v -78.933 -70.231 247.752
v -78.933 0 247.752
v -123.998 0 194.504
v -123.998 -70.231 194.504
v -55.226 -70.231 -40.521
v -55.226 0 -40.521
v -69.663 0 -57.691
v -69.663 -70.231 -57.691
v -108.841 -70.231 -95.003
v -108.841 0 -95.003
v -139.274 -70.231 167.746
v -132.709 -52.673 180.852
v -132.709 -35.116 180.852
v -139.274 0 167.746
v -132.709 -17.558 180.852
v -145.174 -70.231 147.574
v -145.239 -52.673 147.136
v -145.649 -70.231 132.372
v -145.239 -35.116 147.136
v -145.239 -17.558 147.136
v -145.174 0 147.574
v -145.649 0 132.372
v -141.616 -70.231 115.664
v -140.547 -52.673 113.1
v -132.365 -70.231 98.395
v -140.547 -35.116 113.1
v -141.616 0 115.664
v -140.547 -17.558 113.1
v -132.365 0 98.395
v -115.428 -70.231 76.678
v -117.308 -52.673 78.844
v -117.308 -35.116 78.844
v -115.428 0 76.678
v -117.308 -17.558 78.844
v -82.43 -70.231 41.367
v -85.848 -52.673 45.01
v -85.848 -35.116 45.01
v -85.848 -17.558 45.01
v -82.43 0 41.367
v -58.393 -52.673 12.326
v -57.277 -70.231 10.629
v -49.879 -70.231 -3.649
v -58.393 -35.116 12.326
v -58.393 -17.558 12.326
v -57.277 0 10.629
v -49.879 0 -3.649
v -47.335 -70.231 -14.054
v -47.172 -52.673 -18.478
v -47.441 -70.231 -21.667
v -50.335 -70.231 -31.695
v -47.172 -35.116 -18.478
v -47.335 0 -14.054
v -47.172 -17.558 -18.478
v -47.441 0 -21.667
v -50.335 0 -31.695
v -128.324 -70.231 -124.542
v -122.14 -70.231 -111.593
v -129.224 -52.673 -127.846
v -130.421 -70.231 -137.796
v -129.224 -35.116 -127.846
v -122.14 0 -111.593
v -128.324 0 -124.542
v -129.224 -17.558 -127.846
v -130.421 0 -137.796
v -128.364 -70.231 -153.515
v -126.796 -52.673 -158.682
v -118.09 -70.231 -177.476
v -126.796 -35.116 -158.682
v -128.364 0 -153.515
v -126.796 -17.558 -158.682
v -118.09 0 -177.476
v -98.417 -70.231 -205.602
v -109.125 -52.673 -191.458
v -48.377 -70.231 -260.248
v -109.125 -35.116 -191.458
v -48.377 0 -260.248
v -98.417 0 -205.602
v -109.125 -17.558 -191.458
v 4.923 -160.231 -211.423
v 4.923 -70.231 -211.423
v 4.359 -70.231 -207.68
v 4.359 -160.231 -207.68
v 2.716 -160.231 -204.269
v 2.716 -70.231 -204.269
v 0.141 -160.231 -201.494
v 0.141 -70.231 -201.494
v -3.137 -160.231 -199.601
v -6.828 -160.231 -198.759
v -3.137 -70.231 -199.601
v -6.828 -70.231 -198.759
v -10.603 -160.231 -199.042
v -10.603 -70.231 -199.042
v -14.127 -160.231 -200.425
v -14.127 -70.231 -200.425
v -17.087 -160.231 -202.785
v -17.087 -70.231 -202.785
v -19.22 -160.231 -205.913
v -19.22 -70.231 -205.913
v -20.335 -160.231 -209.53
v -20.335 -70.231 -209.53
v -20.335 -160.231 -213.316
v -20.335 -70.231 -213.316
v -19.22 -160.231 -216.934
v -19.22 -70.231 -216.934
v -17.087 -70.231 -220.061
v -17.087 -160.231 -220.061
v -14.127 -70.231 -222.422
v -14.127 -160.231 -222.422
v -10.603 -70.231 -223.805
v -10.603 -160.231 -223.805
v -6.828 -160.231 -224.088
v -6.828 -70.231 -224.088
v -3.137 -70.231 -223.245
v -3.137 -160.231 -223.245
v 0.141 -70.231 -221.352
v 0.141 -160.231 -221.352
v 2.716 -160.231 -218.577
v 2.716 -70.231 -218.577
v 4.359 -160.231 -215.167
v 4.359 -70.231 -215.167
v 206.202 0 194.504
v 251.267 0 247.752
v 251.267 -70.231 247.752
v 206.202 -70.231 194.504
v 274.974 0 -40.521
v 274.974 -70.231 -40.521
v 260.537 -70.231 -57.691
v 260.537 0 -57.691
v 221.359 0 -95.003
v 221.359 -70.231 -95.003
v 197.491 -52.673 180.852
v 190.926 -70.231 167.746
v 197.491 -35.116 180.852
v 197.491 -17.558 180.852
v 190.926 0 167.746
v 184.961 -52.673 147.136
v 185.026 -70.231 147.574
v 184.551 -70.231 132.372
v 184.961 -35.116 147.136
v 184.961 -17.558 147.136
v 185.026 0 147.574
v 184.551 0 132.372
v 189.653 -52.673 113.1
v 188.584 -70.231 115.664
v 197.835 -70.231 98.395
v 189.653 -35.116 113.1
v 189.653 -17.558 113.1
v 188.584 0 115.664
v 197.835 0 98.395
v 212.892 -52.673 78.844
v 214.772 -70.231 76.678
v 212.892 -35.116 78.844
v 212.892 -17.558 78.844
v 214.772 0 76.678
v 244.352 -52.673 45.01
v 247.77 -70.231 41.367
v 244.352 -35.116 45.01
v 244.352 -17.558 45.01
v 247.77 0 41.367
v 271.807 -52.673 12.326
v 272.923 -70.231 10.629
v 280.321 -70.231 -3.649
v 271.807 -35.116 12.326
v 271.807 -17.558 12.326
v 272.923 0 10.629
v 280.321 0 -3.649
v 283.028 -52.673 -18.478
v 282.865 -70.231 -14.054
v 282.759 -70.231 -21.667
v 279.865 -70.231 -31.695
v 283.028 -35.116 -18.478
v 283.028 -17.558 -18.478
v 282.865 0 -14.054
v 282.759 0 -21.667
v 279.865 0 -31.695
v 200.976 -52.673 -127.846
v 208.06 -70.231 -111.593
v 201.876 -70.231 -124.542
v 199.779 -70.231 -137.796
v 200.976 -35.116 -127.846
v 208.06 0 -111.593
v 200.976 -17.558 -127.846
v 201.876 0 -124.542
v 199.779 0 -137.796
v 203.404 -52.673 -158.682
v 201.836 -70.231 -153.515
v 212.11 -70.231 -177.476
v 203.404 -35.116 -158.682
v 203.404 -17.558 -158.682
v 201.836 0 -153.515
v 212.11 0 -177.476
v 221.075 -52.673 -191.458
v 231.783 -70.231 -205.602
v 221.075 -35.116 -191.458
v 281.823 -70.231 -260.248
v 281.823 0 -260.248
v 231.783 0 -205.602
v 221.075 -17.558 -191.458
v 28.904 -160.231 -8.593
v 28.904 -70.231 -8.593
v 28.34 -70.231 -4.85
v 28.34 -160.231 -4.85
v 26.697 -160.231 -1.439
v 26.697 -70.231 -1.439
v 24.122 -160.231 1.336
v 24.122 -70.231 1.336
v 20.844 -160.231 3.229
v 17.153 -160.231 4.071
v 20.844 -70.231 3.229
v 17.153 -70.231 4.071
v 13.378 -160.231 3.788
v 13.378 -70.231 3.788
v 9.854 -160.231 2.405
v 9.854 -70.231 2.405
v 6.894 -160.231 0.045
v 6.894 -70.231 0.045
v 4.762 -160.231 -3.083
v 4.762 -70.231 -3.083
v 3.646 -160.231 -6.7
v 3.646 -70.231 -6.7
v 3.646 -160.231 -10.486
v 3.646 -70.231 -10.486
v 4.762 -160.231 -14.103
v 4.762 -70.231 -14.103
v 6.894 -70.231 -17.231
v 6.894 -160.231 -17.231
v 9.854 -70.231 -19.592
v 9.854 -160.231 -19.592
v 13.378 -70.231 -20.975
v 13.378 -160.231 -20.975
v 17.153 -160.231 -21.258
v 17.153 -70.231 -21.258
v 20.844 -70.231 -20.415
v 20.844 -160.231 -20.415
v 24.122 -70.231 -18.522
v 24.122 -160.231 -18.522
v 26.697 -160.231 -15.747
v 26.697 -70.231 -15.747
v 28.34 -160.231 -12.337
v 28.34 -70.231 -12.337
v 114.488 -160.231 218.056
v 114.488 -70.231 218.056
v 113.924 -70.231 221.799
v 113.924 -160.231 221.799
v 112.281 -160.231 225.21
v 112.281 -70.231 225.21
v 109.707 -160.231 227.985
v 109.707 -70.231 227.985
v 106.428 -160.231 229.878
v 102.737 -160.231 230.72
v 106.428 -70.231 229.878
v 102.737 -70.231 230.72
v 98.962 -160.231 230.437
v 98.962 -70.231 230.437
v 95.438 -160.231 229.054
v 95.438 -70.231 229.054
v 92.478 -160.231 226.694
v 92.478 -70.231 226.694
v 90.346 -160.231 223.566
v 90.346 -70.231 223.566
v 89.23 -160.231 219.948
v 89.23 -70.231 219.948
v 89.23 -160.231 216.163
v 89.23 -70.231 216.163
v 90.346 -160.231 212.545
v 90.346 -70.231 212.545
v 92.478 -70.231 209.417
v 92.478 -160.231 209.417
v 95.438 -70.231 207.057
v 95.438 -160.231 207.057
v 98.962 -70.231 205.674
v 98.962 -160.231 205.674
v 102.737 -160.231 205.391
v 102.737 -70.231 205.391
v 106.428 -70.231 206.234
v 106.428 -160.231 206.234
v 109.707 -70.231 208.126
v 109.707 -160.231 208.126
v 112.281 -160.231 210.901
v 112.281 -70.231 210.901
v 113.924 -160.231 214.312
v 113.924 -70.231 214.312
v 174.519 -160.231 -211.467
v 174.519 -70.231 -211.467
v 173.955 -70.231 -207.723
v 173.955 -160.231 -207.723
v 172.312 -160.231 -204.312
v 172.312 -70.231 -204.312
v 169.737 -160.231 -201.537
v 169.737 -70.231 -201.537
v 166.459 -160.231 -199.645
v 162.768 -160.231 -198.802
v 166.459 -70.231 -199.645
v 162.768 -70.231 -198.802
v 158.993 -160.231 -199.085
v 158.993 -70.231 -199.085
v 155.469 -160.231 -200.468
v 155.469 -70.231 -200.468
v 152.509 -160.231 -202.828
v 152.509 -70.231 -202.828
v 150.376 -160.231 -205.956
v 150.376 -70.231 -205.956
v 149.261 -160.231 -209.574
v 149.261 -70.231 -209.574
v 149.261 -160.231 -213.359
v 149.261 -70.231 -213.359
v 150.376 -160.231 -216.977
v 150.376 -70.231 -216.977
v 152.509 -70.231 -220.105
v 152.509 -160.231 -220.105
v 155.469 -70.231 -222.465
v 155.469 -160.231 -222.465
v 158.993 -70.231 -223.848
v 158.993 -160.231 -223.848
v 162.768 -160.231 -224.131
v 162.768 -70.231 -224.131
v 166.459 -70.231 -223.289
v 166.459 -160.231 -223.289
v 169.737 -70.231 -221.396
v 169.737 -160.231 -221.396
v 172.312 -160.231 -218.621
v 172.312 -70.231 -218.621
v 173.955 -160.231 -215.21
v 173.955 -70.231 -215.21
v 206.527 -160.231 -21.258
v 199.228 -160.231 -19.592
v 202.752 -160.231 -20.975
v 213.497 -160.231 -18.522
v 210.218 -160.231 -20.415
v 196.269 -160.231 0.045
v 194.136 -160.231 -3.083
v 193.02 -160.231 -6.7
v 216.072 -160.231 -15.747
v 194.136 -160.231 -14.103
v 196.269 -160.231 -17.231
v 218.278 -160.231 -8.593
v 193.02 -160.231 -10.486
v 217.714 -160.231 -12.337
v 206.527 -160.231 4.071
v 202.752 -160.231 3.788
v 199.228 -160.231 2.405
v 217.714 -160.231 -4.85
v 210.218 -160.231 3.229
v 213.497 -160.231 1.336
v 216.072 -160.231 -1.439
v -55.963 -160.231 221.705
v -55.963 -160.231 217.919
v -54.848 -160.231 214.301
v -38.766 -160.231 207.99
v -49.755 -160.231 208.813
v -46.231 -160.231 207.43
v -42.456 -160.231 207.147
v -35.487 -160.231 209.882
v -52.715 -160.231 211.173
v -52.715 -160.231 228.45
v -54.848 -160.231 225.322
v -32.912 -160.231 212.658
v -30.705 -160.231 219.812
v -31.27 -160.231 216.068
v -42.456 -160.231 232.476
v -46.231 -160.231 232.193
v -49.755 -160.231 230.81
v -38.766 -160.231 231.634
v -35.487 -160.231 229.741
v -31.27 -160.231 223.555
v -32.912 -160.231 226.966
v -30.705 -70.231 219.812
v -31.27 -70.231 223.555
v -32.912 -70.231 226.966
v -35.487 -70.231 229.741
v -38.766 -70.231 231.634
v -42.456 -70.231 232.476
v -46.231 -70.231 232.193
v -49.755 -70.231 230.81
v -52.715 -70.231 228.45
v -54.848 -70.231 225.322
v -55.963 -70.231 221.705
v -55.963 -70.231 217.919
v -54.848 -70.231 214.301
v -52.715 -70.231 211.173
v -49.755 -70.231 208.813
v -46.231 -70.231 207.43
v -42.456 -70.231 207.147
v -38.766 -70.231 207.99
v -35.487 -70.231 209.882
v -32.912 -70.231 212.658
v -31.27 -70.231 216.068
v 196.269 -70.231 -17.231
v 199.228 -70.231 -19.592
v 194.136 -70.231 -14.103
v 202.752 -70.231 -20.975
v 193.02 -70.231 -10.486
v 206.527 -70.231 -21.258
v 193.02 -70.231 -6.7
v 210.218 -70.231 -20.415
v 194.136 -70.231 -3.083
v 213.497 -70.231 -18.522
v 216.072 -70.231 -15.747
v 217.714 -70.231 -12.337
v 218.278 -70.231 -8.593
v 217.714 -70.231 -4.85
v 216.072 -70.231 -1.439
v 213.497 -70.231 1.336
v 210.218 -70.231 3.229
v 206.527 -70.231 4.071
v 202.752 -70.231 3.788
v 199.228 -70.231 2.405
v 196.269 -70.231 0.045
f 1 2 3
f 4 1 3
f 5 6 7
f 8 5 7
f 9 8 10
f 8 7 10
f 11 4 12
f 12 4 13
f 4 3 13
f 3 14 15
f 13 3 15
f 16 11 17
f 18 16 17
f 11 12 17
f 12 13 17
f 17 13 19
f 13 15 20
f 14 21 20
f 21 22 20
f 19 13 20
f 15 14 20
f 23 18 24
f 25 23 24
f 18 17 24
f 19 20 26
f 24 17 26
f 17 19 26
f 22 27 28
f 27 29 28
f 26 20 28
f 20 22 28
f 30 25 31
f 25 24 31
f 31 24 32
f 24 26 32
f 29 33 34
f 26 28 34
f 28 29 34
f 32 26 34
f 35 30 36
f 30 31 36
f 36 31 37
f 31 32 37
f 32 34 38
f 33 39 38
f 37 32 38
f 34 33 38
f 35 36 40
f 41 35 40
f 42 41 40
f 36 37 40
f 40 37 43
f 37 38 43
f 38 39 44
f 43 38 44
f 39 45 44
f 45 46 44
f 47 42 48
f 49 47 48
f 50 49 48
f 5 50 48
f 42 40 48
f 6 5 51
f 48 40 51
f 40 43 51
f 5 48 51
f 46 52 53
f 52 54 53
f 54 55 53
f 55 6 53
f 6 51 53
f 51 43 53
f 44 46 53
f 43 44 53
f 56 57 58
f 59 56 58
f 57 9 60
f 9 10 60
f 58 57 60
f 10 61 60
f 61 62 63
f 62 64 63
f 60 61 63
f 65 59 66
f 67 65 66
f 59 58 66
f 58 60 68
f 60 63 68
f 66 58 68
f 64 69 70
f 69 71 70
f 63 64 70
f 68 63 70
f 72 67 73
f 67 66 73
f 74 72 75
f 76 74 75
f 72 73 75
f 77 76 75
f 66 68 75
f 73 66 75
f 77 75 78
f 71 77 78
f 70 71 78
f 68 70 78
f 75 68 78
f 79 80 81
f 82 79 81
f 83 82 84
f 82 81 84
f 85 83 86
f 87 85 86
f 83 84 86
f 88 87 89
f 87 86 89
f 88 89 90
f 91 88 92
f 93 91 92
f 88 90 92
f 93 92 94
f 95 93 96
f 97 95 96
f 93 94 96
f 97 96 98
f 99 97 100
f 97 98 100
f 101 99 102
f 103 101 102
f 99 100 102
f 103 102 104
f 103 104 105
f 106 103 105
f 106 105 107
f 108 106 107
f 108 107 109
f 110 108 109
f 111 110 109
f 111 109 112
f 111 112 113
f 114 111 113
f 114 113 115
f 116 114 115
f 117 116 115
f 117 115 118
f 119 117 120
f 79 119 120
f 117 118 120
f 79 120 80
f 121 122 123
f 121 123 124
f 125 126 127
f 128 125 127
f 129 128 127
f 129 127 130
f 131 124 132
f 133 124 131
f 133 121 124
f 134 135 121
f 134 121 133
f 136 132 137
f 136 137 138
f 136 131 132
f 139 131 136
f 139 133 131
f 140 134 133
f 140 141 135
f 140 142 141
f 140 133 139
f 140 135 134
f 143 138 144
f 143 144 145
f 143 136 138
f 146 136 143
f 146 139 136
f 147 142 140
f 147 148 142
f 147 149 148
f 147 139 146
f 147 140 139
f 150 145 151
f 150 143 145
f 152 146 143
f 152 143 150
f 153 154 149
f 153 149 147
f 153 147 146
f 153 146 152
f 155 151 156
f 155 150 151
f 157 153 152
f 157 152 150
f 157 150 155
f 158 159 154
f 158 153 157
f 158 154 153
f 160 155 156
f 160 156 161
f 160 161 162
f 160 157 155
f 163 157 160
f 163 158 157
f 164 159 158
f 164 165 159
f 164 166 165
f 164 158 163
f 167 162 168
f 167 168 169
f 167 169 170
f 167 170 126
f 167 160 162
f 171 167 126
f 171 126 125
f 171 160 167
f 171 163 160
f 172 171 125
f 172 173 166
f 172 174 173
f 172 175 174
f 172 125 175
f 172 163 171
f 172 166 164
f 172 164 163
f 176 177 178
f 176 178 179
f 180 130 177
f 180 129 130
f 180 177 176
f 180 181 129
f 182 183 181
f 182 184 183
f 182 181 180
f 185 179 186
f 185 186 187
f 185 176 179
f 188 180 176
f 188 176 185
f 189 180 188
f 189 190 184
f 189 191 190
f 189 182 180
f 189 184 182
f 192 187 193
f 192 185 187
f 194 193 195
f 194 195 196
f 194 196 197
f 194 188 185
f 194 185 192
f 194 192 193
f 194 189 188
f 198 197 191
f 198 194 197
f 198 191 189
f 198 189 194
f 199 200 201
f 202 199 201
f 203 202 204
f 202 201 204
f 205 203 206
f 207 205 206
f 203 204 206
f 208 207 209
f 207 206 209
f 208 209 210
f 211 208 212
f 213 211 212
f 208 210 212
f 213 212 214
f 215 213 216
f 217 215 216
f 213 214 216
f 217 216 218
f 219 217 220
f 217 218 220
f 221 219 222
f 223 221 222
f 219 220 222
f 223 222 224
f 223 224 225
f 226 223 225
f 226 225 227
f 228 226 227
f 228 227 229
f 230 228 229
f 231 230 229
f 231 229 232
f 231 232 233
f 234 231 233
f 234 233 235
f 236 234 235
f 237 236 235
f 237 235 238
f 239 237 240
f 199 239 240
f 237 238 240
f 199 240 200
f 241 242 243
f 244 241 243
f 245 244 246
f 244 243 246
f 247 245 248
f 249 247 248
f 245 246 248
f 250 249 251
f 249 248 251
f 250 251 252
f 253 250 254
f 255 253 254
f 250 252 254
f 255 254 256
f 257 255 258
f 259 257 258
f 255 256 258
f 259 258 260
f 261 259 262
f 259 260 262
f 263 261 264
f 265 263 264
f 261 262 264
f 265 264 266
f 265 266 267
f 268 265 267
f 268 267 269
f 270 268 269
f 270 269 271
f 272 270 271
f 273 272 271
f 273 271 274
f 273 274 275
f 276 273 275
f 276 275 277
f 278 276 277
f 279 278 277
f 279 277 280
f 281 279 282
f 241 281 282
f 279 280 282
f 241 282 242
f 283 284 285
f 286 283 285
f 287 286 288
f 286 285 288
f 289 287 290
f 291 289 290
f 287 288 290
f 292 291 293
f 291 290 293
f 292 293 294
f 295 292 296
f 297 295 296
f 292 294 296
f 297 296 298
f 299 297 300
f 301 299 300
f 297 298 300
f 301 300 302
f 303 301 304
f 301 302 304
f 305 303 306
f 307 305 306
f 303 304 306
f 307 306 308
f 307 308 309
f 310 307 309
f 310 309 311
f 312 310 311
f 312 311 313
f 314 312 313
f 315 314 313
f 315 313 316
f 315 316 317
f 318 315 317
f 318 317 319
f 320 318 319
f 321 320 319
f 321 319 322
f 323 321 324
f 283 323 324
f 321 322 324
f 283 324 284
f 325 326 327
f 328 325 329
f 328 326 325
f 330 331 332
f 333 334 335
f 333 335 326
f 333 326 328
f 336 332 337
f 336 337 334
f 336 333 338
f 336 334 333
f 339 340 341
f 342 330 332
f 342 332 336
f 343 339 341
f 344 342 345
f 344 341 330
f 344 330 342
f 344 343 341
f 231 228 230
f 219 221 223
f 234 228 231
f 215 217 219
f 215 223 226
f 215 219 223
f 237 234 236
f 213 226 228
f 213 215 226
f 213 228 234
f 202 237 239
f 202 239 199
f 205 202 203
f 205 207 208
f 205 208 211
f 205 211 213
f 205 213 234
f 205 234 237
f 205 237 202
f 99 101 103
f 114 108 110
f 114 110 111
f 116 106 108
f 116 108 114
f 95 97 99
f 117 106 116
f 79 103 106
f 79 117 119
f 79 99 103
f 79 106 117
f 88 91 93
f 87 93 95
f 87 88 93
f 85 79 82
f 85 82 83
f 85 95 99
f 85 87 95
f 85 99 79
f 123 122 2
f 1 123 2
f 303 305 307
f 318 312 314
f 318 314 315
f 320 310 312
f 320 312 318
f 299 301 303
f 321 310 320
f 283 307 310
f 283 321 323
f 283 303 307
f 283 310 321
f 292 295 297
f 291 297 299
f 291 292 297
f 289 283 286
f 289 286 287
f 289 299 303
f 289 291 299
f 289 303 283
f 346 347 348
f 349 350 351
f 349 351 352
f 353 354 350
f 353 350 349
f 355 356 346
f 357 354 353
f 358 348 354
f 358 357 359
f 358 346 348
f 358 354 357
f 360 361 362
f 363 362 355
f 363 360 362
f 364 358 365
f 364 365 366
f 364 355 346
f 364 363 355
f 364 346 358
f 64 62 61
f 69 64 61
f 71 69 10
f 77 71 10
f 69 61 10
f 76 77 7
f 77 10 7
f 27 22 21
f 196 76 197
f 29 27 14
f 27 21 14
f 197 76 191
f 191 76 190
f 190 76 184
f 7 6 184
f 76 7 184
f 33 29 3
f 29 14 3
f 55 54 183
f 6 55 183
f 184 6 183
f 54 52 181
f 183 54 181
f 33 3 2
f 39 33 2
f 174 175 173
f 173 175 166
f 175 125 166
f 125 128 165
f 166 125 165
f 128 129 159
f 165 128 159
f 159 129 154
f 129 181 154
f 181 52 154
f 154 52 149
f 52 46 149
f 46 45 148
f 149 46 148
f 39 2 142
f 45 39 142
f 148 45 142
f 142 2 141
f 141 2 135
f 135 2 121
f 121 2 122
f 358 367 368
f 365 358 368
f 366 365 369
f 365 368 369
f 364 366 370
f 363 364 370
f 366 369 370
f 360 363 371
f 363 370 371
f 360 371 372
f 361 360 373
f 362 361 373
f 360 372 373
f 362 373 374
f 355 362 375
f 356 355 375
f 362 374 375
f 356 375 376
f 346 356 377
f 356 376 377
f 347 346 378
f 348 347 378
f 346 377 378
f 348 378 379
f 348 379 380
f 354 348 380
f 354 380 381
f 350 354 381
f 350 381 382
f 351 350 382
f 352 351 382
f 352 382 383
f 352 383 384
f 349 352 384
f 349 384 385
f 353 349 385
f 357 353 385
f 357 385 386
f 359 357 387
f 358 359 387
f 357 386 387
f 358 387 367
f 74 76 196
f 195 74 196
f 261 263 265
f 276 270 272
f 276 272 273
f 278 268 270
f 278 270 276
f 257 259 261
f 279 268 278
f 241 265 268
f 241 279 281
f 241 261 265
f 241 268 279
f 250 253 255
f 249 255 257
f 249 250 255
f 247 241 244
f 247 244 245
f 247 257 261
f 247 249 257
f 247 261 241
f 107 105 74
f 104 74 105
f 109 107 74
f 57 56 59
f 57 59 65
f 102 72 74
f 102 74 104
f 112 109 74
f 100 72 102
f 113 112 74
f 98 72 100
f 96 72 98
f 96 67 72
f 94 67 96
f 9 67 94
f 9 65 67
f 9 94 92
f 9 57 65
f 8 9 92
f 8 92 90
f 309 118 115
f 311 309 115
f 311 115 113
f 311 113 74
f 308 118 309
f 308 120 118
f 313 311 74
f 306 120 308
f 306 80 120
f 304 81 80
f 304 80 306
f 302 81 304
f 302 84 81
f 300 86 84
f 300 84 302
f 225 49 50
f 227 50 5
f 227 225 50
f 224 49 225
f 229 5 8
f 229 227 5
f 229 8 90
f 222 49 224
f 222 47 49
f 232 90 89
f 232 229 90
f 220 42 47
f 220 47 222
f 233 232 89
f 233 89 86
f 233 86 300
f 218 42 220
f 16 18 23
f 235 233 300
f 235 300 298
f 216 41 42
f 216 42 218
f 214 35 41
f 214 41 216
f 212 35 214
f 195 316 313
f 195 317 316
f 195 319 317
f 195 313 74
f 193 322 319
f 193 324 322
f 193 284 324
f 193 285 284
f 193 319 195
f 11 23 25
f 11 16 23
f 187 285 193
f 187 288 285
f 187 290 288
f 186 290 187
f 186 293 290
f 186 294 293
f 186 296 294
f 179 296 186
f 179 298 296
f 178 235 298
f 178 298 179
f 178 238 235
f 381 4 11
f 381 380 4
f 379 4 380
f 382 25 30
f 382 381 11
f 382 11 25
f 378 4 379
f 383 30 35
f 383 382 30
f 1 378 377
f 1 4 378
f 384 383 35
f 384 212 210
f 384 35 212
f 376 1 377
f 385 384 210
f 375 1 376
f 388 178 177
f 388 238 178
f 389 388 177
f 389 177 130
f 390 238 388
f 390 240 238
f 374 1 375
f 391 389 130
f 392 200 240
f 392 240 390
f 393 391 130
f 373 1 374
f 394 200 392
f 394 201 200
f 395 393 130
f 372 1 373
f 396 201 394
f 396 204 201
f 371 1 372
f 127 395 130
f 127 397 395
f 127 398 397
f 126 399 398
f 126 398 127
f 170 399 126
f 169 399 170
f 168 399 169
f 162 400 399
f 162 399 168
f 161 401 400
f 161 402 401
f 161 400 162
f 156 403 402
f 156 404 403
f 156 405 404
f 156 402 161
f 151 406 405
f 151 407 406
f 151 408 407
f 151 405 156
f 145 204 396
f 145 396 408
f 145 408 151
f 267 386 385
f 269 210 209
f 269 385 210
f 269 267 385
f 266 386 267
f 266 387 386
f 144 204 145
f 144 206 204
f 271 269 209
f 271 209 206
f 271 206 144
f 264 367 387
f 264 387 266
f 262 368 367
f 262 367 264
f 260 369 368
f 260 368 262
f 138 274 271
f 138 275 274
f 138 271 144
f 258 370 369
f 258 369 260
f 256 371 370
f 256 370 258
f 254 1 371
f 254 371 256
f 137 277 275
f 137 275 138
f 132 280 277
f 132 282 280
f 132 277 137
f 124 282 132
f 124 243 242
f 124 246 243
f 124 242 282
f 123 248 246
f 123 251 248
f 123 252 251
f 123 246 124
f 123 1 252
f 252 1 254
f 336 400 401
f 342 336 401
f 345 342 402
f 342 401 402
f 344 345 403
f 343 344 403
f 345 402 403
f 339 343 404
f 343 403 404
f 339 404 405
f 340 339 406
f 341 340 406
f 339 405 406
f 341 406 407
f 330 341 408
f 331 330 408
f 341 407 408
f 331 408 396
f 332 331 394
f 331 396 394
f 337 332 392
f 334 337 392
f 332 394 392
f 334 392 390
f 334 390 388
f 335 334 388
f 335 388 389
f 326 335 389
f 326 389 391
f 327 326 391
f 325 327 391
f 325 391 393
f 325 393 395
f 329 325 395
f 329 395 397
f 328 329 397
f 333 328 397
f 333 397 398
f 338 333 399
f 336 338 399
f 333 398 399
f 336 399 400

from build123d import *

# Parameters (mm, degrees)
F1_DEPTH = 70.231
F2_R     = 12.7
F3_DEPTH = 90


with BuildPart() as f1:
    # F0 (on Front) → F1 (new body)
    with BuildSketch(Plane.XZ):
        with BuildLine():
            Line((251.2670120408, 247.751693517), (-78.9329879592, 247.751693517))
            add(Edge.make_bspline(
                [(-78.9329879592, 247.751693517), (-118.4500863393, 204.8103487339), (-200.3621854776, 115.8003800066), (25.1837263388, -20.5192498905), (-185.5970216319, -118.7000407816), (-95.5666307907, -211.5703613415), (-48.3772337904, -260.248306483)],
                knots=[0, 0, 0, 0, 0.2454169643, 0.5087068519, 0.742488873, 1, 1, 1, 1], degree=3))
            Line((-48.3772337904, -260.248306483), (281.8227662096, -260.248306483))
            add(Edge.make_bspline(
                [(251.2670120408, 247.751693517), (211.7499136607, 204.8103487339), (129.8378145224, 115.8003800066), (355.3837263388, -20.5192498905), (144.6029783681, -118.7000407816), (234.6333692093, -211.5703613415), (281.8227662096, -260.248306483)],
                knots=[0, 0, 0, 0, 0.2454169643, 0.5087068519, 0.742488873, 1, 1, 1, 1], degree=3))
        make_face()
    extrude(amount=F1_DEPTH)

    # F2 (on face) → F3 (join)
    with BuildSketch(Plane.XZ.offset(70.231)):
        with Locations((-43.4053327055, 219.811693517)):
            Circle(F2_R)
        with BuildLine():
            ThreePointArc((192.8783785065, -8.5931712189), (205.5783785065, -21.2931712189), (218.2783785065, -8.5931712189))
            ThreePointArc((218.2783785065, -8.5931712189), (205.5783785065, 4.1068287811), (192.8783785065, -8.5931712189))
        make_face()
        with Locations((16.2040890428, -8.5931712189)):
            Circle(F2_R)
        with Locations((101.7882398762, 218.055621855)):
            Circle(F2_R)
        with Locations((161.8187696549, -211.4666253835)):
            Circle(F2_R)
        with Locations((-7.777258361, -211.4231900456)):
            Circle(F2_R)
    extrude(amount=F3_DEPTH)


solid = f1.part
